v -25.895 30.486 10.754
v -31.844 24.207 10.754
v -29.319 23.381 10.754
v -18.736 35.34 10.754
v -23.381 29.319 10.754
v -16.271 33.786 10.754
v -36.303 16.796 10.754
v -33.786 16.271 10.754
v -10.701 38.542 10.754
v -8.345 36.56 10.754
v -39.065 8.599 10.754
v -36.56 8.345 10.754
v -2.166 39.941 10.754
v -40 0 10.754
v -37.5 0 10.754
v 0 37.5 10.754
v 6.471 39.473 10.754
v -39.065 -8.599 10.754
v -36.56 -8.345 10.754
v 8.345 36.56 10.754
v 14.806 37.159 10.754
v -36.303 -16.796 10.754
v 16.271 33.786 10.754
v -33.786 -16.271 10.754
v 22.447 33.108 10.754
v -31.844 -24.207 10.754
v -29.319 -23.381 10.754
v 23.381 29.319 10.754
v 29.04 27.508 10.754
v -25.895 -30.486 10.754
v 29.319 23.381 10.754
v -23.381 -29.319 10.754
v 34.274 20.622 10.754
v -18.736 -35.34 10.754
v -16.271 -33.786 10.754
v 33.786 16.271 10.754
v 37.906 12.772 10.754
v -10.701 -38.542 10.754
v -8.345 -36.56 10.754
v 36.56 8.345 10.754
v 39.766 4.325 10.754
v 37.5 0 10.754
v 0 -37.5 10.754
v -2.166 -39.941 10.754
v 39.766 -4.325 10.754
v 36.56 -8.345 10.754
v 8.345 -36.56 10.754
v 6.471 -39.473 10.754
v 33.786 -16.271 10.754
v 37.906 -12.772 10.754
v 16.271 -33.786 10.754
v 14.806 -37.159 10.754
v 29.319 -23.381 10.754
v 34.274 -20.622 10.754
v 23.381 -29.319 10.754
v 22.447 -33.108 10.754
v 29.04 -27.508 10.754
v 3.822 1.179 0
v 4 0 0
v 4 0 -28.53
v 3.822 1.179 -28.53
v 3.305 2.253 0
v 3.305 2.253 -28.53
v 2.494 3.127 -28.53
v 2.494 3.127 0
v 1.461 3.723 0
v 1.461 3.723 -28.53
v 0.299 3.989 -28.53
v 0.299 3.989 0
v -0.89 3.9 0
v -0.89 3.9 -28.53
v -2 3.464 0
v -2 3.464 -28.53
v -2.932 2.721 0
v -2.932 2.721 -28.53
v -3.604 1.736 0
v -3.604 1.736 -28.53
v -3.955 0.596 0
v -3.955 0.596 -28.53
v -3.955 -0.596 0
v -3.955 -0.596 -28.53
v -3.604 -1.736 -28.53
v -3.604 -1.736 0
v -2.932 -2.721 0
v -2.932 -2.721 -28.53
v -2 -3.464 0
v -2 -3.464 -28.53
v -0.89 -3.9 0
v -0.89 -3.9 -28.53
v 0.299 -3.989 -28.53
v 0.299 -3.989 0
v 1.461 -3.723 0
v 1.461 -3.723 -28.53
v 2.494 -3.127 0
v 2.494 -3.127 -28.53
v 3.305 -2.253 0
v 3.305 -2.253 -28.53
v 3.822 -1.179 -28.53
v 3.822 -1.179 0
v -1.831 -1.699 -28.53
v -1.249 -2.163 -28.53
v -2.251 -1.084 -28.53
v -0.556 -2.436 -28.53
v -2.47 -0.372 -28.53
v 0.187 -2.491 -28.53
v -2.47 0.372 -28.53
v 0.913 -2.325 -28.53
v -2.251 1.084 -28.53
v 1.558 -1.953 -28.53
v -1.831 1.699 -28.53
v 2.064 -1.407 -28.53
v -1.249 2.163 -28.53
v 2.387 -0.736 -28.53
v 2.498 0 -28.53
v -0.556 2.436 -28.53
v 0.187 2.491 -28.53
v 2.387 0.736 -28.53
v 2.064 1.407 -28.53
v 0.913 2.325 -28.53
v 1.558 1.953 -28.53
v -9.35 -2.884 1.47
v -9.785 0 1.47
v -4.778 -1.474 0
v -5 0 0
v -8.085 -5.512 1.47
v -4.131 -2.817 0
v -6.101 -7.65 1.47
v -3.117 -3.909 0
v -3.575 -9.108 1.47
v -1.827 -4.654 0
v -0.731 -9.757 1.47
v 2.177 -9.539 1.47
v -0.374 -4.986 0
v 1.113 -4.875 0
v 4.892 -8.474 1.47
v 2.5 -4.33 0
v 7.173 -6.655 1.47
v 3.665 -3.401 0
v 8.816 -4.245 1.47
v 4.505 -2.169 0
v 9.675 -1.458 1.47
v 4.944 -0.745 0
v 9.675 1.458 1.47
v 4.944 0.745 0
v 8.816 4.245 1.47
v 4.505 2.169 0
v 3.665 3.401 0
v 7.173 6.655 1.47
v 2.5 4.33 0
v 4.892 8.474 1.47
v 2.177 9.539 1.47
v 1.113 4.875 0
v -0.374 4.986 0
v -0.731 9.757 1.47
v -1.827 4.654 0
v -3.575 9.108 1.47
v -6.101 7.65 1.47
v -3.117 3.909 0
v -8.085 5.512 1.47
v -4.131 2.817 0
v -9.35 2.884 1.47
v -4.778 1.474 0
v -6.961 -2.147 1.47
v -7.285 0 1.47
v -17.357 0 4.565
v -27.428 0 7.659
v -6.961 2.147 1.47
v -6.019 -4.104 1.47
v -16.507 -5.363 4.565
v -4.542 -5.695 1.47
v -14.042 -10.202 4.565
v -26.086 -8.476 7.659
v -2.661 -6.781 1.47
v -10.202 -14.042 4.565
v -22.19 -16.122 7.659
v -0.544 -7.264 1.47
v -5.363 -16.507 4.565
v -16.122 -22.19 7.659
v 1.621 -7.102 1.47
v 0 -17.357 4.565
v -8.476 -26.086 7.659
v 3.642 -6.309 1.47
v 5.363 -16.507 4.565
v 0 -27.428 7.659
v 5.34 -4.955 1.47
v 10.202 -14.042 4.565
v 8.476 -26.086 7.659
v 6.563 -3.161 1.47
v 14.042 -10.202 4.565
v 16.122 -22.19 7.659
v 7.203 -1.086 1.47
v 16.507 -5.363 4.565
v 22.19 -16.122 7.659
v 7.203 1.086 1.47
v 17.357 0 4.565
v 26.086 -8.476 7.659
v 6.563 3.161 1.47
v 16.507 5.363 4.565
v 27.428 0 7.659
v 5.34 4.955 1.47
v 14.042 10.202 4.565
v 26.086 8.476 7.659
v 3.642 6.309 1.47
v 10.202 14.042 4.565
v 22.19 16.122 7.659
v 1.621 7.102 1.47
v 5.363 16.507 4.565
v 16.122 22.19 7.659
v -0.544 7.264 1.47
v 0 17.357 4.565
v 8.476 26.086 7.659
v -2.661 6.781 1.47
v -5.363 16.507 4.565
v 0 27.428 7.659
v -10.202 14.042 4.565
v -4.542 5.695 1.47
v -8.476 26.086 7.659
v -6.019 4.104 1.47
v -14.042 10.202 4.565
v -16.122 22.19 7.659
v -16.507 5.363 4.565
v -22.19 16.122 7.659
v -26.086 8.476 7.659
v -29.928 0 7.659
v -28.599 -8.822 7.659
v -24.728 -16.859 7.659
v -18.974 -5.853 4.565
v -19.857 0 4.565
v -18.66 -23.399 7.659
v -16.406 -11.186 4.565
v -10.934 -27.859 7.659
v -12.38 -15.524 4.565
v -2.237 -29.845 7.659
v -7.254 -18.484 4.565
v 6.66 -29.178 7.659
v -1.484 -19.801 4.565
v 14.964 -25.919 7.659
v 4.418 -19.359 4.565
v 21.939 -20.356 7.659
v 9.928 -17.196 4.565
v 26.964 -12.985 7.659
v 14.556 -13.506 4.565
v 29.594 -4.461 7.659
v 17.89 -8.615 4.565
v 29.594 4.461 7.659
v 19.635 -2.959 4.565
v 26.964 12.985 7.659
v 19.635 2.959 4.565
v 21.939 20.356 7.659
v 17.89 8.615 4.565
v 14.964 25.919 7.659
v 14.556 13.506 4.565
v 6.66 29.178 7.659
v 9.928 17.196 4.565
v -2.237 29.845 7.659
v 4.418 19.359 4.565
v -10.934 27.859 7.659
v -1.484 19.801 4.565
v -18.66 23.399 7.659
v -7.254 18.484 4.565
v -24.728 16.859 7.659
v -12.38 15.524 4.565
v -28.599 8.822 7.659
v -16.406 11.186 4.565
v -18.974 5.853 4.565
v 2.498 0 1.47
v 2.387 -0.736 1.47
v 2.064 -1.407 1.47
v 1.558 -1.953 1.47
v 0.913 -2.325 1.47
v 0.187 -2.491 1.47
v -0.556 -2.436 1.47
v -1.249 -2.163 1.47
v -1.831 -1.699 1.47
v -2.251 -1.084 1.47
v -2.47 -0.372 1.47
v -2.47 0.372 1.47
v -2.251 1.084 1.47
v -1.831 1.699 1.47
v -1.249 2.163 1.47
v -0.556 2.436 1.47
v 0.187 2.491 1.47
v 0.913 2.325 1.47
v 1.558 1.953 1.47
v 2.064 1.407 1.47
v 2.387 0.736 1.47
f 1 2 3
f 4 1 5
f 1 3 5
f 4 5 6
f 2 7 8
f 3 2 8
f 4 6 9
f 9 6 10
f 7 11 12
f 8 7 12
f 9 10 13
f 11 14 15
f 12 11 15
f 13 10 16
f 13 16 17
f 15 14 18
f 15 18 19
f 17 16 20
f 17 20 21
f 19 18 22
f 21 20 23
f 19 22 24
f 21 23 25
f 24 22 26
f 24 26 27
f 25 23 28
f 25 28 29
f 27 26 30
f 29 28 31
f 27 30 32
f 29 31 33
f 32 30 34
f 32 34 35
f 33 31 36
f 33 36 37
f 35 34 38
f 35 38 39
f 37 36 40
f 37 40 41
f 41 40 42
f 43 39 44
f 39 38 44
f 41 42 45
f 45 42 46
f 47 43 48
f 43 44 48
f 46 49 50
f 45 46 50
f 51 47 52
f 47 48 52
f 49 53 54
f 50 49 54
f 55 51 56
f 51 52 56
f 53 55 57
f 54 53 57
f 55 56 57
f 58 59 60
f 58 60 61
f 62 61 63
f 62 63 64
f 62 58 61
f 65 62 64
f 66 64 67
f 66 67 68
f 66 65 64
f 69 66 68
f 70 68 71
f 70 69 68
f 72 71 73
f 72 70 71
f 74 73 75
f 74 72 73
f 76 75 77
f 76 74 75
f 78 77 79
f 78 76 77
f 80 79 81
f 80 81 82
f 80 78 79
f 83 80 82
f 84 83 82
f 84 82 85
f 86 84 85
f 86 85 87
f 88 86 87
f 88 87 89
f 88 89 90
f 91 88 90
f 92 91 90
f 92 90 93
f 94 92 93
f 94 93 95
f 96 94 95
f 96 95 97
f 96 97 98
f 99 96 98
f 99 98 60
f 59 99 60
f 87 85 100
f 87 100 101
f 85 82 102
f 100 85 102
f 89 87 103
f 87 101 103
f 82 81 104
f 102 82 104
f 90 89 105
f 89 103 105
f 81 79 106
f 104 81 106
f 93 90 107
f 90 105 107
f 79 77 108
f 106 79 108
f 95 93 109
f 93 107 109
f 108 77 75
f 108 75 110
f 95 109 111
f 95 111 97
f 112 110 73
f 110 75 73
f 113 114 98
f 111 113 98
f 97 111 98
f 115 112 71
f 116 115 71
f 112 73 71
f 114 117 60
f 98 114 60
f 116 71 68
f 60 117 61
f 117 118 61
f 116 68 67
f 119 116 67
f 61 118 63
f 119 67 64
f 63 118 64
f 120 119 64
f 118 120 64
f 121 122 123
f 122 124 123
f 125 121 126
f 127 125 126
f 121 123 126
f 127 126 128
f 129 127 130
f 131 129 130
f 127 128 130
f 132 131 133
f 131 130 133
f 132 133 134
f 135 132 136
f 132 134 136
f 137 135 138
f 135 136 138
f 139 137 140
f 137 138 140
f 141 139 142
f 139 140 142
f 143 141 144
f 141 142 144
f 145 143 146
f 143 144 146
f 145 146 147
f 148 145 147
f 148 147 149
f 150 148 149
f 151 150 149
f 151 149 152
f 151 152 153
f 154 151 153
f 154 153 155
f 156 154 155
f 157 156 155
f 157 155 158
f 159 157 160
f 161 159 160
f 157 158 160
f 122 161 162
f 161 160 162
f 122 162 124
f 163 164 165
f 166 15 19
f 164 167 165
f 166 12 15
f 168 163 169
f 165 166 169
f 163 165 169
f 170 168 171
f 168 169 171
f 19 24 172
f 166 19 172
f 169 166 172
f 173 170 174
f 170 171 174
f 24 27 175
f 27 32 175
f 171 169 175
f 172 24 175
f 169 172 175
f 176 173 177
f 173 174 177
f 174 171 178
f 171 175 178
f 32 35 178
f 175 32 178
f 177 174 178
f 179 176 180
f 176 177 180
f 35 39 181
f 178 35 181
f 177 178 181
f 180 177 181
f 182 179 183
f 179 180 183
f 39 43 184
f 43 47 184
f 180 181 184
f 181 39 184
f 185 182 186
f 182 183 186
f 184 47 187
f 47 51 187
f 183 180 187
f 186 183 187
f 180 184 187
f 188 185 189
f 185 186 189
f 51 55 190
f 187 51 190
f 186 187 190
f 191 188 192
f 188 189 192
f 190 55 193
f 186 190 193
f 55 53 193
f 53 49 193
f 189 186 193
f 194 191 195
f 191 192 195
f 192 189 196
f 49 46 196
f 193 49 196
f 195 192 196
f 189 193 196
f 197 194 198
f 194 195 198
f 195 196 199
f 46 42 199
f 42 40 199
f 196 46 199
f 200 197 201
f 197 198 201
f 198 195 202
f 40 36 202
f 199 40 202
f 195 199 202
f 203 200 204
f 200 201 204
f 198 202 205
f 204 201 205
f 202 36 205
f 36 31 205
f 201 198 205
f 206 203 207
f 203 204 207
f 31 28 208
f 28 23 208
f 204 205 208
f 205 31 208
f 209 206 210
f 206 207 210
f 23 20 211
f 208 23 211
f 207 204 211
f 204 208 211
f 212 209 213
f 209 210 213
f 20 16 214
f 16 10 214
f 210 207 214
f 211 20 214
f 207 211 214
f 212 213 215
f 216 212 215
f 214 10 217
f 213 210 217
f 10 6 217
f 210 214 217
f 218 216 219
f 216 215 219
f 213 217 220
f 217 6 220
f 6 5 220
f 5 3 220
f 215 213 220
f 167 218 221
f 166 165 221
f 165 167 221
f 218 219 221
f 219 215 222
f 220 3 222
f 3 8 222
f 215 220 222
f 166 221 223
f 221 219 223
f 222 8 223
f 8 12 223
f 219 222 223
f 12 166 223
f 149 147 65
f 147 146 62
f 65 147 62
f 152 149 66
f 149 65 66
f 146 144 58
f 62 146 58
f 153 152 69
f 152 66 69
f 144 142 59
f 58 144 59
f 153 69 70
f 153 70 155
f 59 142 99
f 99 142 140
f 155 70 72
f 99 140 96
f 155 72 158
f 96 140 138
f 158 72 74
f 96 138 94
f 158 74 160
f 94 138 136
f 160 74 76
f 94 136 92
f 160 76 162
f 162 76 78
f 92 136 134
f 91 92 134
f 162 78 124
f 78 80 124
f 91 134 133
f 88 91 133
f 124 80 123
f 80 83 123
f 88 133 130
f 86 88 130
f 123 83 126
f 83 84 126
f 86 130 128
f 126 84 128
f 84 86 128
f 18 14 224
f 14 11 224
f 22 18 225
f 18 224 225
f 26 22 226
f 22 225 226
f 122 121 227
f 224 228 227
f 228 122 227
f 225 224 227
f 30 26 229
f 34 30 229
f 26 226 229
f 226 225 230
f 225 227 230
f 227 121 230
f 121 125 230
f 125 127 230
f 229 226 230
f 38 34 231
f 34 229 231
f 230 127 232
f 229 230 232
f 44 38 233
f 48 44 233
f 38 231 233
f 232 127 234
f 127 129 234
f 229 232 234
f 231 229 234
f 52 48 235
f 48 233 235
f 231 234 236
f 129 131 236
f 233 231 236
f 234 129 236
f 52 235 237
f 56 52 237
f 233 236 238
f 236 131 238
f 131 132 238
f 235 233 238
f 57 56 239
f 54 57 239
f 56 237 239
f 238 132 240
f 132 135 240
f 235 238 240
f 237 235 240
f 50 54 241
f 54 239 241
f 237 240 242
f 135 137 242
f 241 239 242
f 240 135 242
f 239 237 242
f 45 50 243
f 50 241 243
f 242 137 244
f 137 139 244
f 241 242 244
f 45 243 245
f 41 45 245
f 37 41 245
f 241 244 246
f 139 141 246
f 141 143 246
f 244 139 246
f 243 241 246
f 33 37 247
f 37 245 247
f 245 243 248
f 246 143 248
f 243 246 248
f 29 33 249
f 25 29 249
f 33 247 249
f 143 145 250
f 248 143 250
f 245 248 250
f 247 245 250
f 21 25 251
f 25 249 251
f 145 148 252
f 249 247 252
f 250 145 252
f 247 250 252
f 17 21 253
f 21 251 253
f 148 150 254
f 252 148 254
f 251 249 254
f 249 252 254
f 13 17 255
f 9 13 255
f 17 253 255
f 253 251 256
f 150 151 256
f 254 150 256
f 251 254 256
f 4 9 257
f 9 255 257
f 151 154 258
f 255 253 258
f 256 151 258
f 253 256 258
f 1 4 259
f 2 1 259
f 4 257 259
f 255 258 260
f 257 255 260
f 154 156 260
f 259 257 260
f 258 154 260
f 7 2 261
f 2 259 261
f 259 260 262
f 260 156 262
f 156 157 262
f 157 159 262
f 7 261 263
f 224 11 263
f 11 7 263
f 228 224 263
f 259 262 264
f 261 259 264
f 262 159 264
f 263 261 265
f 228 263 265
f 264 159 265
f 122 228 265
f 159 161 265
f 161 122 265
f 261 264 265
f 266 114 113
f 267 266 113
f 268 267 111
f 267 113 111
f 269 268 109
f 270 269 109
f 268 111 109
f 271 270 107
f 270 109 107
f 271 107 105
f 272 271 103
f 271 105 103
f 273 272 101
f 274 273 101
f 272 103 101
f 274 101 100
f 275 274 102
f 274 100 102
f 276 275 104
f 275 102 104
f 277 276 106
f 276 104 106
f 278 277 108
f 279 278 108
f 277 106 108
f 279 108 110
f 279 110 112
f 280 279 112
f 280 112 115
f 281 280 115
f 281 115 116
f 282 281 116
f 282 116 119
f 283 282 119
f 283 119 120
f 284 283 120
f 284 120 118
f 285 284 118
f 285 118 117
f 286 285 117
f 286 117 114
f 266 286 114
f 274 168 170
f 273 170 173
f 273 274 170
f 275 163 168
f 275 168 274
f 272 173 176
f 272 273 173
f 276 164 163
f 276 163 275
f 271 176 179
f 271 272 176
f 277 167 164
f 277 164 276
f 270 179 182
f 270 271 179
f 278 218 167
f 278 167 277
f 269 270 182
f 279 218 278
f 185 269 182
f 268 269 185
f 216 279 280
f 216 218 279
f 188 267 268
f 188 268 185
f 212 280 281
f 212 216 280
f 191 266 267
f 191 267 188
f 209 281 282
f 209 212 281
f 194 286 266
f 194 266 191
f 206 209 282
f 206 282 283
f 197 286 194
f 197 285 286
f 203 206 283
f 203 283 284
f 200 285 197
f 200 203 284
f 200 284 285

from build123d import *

# Parameters (mm, degrees)
F2_R     = 4
F3_DEPTH = 30
F5_R     = 2.498158
F6_DEPTH = 50


with BuildPart() as f1:
    # F0 (on Front) → F1 (revolve)
    with BuildSketch(Plane.XZ):
        Polygon((-2.5, 0), (0, 0), (0, 1.470086), (-7.284754, 1.470086), align=None)
        Polygon((-5, 0), (-2.5, 0), (-7.284754, 1.470086), (-9.784754, 1.470086), align=None)
        Polygon((-9.784754, 1.470086), (-7.284754, 1.470086), (-37.5, 10.753534), (-40, 10.753534), align=None)
    revolve(axis=Axis((0, 0, 3.122811), (0, 0, 1)))

    # F2 (on face) → F3 (join)
    with BuildSketch(Plane.XY.offset(1.470086)):
        Circle(F2_R)
    extrude(amount=-F3_DEPTH)

    # F5 (on face) → F6 (cut)
    with BuildSketch(Plane(origin=(0, 0, -28.529914), x_dir=(1, 0, 0), z_dir=(0, 0, -1))):
        Circle(F5_R)
    extrude(amount=-F6_DEPTH, mode=Mode.SUBTRACT)


solid = f1.part
